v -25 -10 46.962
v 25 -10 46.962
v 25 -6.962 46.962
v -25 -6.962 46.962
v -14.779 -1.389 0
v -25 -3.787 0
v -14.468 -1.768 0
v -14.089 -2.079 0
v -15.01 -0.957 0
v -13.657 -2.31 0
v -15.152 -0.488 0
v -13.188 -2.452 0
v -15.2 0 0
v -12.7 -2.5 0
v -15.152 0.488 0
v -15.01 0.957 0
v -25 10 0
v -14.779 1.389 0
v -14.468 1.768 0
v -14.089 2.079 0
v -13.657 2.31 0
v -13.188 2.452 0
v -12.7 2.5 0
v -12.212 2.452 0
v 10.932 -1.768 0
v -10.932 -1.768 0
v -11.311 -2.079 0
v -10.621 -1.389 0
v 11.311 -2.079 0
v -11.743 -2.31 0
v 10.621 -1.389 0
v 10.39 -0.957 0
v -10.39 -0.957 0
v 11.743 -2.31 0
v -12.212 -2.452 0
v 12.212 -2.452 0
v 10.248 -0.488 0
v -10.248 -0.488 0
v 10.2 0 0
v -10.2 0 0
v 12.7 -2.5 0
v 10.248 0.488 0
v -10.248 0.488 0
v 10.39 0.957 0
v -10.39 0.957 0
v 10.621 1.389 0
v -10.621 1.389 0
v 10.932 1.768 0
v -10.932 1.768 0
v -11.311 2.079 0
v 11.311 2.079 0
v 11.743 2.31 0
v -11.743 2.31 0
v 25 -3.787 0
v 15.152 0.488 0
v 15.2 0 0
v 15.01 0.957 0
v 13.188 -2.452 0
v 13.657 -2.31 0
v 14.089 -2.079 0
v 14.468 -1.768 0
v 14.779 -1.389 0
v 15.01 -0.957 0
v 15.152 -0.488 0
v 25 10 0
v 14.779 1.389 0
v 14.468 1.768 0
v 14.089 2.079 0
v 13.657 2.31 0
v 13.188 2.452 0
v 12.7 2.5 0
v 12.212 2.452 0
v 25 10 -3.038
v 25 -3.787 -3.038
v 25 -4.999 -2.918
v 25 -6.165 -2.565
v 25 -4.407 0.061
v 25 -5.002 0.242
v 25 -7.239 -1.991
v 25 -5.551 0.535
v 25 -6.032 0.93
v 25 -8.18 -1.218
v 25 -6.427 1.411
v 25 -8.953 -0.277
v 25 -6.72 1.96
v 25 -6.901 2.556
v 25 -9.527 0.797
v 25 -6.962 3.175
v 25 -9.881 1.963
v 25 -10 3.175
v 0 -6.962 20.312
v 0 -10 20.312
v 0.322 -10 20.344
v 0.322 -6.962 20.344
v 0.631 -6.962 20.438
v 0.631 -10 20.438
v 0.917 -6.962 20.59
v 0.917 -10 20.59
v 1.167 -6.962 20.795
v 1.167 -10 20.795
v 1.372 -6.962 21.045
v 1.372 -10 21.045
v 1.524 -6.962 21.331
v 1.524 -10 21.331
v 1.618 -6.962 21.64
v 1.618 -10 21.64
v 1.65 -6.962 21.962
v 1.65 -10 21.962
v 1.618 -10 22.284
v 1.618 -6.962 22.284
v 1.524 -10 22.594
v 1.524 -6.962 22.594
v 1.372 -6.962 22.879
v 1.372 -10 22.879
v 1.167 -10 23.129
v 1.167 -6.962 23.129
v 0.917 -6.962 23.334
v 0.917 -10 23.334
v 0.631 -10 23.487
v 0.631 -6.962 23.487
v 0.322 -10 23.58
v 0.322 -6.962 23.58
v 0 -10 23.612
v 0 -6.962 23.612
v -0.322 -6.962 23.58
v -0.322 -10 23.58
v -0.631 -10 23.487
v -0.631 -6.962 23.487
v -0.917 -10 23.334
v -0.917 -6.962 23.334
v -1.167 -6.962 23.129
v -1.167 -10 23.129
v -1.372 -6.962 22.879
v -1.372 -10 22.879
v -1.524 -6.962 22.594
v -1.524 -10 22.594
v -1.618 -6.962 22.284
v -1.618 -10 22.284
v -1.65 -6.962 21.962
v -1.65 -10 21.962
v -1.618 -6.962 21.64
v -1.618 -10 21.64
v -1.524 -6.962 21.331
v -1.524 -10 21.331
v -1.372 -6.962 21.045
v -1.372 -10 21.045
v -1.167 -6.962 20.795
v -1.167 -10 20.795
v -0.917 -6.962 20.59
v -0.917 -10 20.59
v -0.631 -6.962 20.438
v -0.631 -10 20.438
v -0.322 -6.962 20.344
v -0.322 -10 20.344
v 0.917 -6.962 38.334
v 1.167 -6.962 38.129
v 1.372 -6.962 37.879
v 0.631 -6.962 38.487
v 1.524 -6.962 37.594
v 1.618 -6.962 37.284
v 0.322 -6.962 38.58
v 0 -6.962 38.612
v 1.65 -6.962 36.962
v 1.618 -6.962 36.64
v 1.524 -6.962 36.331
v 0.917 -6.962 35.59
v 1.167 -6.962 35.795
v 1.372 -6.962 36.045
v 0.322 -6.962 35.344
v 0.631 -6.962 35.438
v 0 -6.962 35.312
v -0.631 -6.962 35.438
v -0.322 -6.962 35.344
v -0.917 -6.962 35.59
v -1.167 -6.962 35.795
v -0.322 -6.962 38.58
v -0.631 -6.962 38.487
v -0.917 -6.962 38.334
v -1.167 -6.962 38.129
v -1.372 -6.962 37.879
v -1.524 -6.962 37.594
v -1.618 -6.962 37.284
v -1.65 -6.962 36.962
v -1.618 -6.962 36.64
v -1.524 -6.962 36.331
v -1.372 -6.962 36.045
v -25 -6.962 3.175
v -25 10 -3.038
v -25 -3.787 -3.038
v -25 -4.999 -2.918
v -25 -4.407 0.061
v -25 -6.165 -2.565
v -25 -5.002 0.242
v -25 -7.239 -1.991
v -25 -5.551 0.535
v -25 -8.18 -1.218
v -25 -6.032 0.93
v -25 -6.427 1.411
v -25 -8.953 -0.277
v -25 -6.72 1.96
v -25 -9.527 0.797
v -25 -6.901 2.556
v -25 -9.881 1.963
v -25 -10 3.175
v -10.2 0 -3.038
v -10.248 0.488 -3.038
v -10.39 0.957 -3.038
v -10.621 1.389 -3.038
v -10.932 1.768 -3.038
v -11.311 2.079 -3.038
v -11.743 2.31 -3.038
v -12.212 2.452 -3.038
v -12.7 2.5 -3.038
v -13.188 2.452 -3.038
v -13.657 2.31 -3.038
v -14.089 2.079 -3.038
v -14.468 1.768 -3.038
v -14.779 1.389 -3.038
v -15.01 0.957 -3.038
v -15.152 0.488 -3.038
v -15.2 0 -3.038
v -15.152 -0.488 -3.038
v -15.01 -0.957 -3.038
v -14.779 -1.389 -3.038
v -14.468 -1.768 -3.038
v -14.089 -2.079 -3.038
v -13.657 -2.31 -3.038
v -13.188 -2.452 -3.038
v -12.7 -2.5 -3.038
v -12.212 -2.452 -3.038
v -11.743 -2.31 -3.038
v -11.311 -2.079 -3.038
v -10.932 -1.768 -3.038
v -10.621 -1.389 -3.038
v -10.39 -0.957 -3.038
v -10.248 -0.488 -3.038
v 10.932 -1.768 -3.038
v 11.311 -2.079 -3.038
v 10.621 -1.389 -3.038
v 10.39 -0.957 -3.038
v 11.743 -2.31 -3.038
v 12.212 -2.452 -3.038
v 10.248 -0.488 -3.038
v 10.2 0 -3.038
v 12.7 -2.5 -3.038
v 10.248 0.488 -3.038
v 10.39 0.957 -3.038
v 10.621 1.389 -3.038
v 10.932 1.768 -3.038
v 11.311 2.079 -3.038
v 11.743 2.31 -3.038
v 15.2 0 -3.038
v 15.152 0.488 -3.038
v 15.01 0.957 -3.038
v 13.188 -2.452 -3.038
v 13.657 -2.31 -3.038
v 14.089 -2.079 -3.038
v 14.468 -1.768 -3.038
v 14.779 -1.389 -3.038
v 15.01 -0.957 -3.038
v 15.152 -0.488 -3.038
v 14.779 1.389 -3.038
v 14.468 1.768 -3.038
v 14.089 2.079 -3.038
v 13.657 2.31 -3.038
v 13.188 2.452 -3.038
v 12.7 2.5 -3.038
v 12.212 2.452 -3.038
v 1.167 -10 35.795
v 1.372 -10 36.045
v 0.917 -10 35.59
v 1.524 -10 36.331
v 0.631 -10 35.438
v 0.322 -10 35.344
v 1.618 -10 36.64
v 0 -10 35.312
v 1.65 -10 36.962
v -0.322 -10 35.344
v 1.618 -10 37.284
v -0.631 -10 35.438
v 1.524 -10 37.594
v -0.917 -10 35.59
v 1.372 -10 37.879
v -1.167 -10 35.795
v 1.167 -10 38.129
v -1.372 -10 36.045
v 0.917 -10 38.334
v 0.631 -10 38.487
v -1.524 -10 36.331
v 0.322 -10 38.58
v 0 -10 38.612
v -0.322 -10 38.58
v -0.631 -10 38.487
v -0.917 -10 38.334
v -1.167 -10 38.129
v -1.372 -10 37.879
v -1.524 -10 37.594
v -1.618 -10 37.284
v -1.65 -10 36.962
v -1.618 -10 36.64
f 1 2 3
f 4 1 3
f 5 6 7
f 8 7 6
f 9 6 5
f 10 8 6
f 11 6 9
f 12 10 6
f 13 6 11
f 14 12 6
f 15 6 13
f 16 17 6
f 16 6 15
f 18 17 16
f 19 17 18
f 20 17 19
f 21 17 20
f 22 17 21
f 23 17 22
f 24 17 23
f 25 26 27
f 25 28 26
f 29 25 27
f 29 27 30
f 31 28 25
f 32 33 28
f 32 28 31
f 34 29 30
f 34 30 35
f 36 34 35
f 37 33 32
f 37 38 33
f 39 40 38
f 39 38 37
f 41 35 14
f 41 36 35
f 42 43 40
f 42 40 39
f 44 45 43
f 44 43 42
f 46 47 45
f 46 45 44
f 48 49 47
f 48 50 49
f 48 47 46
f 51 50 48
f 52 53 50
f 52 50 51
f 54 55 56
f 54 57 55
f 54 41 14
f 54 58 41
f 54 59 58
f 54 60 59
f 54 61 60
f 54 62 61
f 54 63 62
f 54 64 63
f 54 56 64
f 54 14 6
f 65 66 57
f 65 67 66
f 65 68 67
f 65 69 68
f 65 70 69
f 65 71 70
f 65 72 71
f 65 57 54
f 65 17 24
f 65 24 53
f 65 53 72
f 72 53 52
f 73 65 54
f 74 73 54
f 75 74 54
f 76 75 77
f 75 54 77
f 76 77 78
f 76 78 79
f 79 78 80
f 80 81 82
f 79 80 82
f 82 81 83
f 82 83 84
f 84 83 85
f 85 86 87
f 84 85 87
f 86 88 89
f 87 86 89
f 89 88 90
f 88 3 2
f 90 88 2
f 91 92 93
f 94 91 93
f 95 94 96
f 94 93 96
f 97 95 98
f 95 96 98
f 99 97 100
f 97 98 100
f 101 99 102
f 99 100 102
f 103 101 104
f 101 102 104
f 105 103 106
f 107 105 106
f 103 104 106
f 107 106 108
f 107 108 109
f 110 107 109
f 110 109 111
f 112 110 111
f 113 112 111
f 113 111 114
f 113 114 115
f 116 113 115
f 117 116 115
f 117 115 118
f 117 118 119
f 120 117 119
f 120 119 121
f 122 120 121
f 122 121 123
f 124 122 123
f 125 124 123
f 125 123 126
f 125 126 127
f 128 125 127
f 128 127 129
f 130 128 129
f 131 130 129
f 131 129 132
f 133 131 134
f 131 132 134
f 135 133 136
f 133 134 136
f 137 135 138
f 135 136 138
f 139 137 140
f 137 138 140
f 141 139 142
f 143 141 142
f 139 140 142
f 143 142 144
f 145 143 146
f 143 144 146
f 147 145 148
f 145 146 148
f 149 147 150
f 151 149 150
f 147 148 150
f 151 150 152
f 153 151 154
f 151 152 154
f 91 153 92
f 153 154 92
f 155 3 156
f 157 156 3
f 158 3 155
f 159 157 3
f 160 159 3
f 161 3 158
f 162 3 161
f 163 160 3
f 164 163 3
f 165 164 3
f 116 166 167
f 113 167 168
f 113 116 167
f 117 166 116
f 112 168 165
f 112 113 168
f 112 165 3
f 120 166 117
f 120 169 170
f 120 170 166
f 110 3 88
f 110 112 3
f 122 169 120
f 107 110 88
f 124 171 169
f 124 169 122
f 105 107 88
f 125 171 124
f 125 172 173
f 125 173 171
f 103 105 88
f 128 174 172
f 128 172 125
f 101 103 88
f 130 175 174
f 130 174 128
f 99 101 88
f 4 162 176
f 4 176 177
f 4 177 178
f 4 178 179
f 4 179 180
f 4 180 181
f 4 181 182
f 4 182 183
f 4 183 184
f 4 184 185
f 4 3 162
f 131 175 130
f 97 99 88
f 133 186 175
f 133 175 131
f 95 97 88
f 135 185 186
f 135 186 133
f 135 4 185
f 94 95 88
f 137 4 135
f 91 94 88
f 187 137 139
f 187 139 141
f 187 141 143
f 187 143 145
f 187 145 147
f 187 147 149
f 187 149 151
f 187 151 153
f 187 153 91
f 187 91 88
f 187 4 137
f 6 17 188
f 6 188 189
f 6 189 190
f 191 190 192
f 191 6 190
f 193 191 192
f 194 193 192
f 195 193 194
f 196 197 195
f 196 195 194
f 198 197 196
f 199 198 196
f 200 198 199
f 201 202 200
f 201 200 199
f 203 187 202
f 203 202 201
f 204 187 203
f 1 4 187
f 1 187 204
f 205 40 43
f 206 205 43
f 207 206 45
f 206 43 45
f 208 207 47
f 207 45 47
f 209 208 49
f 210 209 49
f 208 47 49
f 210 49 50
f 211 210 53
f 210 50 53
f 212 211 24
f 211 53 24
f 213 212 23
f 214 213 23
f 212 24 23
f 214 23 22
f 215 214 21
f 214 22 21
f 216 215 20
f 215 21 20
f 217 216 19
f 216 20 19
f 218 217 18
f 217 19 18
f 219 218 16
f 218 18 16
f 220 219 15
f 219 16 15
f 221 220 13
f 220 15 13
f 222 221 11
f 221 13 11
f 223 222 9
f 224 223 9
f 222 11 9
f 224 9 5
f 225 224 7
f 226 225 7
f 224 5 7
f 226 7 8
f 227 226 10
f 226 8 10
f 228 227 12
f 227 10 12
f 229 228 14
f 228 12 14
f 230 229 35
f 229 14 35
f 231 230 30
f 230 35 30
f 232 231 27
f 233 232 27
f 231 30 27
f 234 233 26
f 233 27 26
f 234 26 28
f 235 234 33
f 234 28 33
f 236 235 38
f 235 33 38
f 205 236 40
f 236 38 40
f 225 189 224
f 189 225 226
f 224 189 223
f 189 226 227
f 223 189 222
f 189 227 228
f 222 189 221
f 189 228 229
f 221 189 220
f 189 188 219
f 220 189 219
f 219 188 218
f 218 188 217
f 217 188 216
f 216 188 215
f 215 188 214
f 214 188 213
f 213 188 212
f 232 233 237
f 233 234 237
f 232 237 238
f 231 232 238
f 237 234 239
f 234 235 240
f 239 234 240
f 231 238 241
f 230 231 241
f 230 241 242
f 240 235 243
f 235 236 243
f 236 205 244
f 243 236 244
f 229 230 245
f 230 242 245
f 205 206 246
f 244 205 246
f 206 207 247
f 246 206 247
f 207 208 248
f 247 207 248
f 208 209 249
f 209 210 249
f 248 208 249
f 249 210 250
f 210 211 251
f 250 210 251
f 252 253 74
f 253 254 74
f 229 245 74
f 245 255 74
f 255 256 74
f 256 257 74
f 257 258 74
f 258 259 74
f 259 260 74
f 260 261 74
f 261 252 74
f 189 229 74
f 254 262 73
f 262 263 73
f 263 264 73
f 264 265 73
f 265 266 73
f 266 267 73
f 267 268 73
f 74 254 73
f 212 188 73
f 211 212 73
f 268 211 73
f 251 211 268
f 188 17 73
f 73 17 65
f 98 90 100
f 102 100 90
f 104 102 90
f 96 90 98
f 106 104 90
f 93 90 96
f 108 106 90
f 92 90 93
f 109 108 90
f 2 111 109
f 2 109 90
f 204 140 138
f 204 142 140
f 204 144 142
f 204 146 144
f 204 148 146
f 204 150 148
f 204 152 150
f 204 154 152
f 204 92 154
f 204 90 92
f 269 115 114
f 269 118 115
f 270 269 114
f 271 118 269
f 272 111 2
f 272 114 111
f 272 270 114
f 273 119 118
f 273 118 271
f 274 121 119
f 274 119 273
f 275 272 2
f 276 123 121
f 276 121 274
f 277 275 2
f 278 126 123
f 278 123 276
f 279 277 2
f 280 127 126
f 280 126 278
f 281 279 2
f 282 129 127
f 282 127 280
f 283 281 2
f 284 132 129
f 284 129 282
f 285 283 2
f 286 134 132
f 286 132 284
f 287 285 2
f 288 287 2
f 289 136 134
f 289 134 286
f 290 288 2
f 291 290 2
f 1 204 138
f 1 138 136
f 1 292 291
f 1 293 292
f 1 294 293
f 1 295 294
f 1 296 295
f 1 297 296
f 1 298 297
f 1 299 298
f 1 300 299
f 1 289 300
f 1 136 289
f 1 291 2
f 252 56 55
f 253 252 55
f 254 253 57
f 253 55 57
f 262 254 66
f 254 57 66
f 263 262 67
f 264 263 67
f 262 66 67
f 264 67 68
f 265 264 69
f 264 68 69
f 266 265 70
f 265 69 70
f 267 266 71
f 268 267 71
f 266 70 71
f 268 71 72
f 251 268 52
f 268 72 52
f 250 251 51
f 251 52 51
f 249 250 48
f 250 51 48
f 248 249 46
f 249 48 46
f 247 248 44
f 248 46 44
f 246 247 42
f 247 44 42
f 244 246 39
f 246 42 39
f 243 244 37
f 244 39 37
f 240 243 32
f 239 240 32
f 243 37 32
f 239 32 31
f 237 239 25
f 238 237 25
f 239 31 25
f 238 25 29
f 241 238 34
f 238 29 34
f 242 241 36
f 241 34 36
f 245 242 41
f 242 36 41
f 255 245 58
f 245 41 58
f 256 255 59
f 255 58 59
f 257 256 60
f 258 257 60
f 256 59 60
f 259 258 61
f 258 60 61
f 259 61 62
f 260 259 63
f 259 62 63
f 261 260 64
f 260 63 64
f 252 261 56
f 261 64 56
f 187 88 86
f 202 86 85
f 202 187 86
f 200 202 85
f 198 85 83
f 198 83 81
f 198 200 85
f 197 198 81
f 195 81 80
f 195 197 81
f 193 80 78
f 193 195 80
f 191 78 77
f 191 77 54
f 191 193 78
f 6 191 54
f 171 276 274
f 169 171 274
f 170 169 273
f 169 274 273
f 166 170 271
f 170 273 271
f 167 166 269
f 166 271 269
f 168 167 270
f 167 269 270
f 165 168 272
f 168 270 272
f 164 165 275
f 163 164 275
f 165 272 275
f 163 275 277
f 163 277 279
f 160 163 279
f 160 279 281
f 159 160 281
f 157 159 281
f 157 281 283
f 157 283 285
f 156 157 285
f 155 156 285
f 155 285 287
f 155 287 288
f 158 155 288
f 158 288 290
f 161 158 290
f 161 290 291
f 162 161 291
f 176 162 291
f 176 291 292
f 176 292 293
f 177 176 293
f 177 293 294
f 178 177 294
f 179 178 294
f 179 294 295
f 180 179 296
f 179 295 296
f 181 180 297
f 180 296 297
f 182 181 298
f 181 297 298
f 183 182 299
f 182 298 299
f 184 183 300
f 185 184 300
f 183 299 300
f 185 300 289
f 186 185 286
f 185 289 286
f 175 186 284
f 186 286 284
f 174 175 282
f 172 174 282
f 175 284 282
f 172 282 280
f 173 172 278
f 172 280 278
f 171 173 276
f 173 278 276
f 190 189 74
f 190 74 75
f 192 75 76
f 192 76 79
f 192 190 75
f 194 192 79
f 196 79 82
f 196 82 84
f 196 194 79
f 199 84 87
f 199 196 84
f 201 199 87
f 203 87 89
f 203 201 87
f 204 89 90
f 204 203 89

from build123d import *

# Parameters (mm, degrees)
CROQUIS1_W                       = 50
CROQUIS1_H                       = 20
CROQUIS1_R                       = 2.5
BRIDA_BASE1_DEPTH                = 3.03784
BRIDA_DE_ARISTA1_STRIP_W         = 18.50136
BRIDA_DE_ARISTA1_STRIP_H         = 3.03784
BRIDA_DE_ARISTA1_STRIP_CUT_DEPTH = 50
BRIDA_DE_ARISTA1_DEPTH           = 50
CORTAR_EXTRUIR1_REACH            = 58.837
CROQUIS9_R                       = 1.65


# Sheet-metal steps are written as plain solids
with BuildPart() as part:
    # Croquis1 → Brida base1 (new body)
    with BuildSketch(Plane.XY):
        Rectangle(CROQUIS1_W, CROQUIS1_H)
        with Locations((-12.7, 0)):
            Circle(CROQUIS1_R, mode=Mode.SUBTRACT)
        with Locations((12.7, 0)):
            Circle(CROQUIS1_R, mode=Mode.SUBTRACT)
    extrude(amount=-BRIDA_BASE1_DEPTH)

    # Brida de arista1 strip (across the edge) → Brida de arista1 strip cut (cut)
    with BuildSketch(Plane(origin=(-25, -10, 0), x_dir=(0, 1, 0), z_dir=(1, 0, 0))):
        with Locations((-3.03784, -1.51892)):
            Rectangle(BRIDA_DE_ARISTA1_STRIP_W, BRIDA_DE_ARISTA1_STRIP_H)
    extrude(amount=BRIDA_DE_ARISTA1_STRIP_CUT_DEPTH, mode=Mode.SUBTRACT)

    # Brida de arista1 section (across the edge) → Brida de arista1 (add)
    with BuildSketch(Plane(origin=(-25, -10, 0), x_dir=(0, 1, 0), z_dir=(1, 0, 0))):
        with BuildLine():
            Line((0, 3.175), (0, 46.96216))
            Line((0, 46.96216), (3.03784, 46.96216))
            Line((3.03784, 46.96216), (3.03784, 3.175))
            ThreePointArc((3.03784, 3.175), (3.96777597, 0.92993597), (6.21284, 0))
            Line((6.21284, 0), (6.21284, -3.03784))
            ThreePointArc((6.21284, -3.03784), (1.819698706, -1.218141294), (0, 3.175))
        make_face()
    extrude(amount=BRIDA_DE_ARISTA1_DEPTH)

    # Croquis9 → Cortar-Extruir1 (cut, up to next)
    with BuildSketch(Plane(origin=(0, -10, 0), x_dir=(-1, 0, 0), z_dir=(0, -1, 0)), mode=Mode.PRIVATE) as cortar_extruir1_sk1:
        with Locations(Location((0, -36.96216, 0), (0, 0, 90))):
            Circle(CROQUIS9_R)
    cortar_extruir1_tool1 = extrude(cortar_extruir1_sk1.sketch, amount=-CORTAR_EXTRUIR1_REACH, mode=Mode.PRIVATE) & part.part
    # Croquis9 → Cortar-Extruir1 (cut, up to next)
    with BuildSketch(Plane(origin=(0, -10, 0), x_dir=(-1, 0, 0), z_dir=(0, -1, 0)), mode=Mode.PRIVATE) as cortar_extruir1_sk2:
        with Locations(Location((0, -21.96216, 0), (0, 0, 90))):
            Circle(CROQUIS9_R)
    cortar_extruir1_tool2 = extrude(cortar_extruir1_sk2.sketch, amount=-CORTAR_EXTRUIR1_REACH, mode=Mode.PRIVATE) & part.part
    add(cortar_extruir1_tool1.solids().sort_by_distance((0, -10, 36.96216))[0], mode=Mode.SUBTRACT)
    add(cortar_extruir1_tool2.solids().sort_by_distance((0, -10, 21.96216))[0], mode=Mode.SUBTRACT)


solid = part.part
